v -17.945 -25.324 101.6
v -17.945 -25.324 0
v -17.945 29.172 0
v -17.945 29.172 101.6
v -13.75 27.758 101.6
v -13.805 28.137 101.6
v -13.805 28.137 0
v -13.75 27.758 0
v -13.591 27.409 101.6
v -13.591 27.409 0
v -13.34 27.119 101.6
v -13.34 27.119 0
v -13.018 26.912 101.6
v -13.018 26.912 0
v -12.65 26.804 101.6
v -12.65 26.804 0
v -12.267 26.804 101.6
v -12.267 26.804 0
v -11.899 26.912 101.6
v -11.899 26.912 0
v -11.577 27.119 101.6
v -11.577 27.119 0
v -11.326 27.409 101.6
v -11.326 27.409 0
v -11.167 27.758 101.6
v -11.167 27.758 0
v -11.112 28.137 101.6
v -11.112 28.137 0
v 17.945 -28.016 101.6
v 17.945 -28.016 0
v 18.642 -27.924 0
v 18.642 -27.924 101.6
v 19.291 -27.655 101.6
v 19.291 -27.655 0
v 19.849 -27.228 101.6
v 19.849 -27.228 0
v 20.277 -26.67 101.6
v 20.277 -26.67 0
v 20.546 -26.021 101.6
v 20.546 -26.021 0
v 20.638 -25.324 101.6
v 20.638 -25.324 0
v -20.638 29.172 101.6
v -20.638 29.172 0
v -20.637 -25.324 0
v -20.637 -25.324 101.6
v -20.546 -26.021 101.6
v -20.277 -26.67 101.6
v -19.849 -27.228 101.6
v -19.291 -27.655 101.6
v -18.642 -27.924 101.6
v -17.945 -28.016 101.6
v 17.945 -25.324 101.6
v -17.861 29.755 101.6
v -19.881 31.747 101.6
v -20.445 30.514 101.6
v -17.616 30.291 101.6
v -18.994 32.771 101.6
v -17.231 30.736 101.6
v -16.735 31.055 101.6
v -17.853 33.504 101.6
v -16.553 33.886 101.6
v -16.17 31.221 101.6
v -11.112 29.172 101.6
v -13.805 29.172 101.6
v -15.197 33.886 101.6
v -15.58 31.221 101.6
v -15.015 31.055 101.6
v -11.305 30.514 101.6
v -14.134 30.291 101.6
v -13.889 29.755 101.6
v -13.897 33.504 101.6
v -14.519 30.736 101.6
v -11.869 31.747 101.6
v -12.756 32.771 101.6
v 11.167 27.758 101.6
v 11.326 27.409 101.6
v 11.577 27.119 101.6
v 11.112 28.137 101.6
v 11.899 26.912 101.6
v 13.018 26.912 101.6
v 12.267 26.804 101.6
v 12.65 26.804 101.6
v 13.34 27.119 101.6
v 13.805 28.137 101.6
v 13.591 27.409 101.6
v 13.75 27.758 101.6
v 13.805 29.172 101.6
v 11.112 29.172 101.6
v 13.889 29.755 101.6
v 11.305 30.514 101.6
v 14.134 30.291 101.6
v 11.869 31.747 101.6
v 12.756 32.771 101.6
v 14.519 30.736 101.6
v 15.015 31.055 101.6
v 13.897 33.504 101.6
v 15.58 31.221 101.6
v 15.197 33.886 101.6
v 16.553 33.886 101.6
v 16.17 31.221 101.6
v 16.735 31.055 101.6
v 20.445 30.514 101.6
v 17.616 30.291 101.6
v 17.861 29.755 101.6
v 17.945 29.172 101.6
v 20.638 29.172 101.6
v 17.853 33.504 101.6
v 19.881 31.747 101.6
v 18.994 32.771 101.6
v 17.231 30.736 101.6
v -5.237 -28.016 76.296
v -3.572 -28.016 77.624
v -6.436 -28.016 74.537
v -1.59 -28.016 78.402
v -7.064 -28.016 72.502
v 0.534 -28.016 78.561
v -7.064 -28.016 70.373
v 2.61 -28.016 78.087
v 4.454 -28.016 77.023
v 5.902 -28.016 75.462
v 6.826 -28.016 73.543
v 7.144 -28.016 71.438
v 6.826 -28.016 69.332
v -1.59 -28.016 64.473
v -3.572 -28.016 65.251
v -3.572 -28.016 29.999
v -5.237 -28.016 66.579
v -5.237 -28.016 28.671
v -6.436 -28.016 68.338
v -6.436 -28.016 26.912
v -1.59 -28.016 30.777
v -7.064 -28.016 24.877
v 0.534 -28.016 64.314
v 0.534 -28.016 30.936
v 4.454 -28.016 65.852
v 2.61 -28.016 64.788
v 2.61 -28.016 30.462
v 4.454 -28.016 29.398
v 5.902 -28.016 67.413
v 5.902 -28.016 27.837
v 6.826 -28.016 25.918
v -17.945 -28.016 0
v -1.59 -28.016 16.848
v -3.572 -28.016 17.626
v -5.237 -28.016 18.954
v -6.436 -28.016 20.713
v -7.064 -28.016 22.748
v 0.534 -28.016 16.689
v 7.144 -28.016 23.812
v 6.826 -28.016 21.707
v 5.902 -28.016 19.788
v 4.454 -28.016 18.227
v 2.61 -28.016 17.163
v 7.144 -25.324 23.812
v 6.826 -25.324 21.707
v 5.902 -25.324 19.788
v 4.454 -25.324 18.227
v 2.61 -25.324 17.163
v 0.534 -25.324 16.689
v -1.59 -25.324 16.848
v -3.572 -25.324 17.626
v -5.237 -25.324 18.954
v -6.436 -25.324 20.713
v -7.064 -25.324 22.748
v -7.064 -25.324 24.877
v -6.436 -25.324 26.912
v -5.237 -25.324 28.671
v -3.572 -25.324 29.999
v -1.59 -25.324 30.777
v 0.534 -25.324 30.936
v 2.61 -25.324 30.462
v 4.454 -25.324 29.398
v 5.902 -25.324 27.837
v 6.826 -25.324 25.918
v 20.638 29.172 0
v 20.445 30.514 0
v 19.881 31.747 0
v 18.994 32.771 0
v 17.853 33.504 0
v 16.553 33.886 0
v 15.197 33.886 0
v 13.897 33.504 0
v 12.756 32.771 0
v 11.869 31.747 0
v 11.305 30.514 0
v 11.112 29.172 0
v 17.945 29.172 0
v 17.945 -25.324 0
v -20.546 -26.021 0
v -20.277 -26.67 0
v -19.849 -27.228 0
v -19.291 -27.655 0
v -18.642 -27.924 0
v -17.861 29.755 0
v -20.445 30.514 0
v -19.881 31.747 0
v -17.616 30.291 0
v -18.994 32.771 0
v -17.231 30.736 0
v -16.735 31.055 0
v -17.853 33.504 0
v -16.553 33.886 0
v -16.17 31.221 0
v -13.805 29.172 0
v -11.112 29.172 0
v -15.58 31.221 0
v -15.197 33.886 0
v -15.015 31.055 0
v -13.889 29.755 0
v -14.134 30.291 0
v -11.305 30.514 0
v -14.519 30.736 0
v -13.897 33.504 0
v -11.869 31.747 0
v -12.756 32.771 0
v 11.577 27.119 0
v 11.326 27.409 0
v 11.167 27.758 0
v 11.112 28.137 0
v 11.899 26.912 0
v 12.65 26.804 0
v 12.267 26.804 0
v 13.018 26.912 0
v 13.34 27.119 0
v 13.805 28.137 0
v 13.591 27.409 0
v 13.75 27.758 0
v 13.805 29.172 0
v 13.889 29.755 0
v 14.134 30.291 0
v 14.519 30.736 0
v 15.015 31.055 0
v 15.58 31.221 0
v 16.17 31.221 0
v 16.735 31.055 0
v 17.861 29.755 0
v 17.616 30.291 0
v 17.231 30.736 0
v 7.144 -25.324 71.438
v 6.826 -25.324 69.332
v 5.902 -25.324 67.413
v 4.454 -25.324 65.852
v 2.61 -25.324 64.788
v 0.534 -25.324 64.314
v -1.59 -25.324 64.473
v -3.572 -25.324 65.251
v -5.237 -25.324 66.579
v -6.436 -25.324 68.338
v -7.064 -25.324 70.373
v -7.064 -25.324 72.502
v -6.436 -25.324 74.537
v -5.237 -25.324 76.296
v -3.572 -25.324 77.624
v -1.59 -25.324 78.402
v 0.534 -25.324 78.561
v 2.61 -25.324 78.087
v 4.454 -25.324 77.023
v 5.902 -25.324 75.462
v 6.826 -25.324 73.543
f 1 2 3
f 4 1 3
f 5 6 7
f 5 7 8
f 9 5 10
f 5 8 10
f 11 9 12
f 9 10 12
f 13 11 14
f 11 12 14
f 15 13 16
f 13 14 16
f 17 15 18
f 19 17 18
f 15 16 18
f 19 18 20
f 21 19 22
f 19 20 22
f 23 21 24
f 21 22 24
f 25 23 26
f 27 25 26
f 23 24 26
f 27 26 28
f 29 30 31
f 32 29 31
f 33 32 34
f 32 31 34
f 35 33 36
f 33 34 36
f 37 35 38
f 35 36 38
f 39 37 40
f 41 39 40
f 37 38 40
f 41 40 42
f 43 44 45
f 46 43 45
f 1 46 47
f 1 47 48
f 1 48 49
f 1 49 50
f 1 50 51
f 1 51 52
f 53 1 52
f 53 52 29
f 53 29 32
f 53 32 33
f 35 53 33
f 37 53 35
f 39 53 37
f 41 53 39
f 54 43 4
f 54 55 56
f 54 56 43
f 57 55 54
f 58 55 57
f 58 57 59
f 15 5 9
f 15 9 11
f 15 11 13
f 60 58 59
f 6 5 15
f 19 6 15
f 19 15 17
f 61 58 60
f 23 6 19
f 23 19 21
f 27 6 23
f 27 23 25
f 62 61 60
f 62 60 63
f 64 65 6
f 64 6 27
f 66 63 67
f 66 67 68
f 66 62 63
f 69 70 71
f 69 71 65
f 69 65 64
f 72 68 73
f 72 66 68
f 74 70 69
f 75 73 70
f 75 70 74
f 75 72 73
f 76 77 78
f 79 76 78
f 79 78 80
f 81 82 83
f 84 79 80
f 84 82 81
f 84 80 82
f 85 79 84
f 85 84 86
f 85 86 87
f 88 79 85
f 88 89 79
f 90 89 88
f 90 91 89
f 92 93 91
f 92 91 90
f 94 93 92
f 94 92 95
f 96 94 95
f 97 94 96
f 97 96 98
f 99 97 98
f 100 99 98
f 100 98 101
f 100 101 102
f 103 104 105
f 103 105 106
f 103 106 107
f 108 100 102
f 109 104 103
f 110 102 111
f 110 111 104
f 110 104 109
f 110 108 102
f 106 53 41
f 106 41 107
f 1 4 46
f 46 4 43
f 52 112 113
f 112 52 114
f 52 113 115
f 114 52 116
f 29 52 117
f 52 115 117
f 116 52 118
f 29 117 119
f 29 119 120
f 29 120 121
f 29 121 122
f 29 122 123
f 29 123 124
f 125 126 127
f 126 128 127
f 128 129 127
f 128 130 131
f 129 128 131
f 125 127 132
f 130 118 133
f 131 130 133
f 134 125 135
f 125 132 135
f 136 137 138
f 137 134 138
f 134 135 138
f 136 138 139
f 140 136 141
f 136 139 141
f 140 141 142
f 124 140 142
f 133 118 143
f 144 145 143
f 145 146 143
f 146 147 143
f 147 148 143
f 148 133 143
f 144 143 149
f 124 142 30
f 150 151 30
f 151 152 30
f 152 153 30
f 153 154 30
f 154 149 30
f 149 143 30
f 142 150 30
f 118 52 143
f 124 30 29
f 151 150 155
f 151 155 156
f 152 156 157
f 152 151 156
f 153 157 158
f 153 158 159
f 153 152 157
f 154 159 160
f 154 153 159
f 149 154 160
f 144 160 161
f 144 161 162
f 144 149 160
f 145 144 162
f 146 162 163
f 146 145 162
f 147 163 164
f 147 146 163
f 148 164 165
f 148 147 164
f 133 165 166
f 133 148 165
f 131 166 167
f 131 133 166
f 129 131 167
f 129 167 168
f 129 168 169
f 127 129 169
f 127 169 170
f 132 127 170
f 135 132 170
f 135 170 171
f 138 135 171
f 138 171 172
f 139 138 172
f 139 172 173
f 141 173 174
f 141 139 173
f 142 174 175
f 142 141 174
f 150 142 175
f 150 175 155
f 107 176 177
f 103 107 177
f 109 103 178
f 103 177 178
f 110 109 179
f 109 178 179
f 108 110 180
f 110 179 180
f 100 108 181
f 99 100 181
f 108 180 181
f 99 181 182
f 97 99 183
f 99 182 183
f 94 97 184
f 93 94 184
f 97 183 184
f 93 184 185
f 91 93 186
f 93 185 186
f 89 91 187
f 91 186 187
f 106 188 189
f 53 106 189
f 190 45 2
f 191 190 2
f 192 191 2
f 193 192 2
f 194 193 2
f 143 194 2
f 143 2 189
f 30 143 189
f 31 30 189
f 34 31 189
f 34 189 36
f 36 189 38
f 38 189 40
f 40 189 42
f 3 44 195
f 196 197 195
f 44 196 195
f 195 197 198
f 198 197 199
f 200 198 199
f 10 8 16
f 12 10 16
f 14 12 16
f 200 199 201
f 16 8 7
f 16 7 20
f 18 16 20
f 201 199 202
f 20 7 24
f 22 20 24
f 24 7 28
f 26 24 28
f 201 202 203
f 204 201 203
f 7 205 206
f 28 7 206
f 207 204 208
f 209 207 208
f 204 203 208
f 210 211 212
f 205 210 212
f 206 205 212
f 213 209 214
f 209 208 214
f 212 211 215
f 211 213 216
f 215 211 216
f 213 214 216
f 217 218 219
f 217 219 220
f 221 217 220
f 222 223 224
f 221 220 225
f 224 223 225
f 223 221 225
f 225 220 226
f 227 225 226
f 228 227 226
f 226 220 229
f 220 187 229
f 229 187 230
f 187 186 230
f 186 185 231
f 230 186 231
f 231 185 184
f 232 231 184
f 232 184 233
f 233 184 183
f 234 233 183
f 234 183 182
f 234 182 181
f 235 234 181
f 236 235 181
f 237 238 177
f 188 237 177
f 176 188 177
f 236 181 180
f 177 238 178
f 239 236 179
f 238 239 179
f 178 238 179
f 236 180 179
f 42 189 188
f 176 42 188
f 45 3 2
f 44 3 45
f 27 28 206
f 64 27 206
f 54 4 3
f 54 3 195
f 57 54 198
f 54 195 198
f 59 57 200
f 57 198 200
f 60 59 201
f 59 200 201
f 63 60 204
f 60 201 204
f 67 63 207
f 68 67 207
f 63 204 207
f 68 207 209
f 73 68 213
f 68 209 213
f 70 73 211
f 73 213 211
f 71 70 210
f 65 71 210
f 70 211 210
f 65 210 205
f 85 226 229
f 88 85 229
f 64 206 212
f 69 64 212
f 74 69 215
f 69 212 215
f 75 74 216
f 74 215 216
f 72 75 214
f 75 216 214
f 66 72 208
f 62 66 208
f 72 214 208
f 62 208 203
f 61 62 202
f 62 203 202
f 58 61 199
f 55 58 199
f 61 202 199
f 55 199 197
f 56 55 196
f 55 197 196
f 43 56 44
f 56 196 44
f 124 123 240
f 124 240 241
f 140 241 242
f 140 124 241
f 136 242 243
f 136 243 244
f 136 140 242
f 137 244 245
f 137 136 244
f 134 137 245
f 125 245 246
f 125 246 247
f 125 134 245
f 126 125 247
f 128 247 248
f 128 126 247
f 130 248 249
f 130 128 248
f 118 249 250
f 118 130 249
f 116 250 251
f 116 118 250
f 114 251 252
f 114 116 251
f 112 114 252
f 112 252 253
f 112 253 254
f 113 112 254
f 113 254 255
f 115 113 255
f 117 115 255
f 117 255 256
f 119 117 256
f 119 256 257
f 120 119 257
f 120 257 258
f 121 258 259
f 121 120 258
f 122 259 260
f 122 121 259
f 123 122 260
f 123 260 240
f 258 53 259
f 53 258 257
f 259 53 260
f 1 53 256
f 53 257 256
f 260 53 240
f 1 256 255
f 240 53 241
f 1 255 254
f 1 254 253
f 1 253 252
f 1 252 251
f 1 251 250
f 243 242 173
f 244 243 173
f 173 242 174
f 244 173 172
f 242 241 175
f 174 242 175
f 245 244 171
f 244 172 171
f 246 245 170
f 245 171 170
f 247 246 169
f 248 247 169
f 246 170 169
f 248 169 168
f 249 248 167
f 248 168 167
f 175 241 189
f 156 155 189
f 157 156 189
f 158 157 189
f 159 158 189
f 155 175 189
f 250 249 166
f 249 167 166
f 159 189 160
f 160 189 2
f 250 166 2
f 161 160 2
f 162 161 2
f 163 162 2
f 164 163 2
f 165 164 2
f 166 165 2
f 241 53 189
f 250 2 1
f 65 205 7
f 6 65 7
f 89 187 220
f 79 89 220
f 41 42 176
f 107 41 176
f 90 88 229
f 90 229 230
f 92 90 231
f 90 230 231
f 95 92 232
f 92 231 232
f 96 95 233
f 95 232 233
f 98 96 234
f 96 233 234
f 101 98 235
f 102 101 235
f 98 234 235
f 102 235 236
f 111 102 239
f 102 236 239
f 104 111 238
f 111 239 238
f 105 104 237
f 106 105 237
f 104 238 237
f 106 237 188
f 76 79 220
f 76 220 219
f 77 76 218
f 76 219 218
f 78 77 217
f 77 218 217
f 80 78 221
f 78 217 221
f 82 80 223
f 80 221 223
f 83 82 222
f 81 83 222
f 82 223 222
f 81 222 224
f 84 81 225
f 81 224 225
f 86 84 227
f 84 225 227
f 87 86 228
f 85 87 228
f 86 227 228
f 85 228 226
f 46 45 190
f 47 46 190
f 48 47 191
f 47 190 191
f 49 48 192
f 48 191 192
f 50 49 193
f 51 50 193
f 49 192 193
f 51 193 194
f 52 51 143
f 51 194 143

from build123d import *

# Parameters (mm, degrees)
BASE_EXTRUDE_DEPTH = 101.6
HOLE1_START        = -28.0162
HOLE1_OUTLINE_R    = 7.14375
HOLE1_DEPTH        = 2.6924
LPATTERN2_COUNT    = 2
LPATTERN2_PITCH    = 47.625


# Read off the part's stored shape, not the designer's step: Hole1
with BuildPart() as part:
    # Sketch1 → Base-Extrude (new body)
    with BuildSketch(Plane.XY):
        with BuildLine():
            Line((-20.6375, 29.1719), (-20.6375, -25.3238))
            ThreePointArc((-20.6375, -25.3238), (-19.848914298, -27.227614298), (-17.9451, -28.0162))
            Line((-17.9451, -28.0162), (17.9451, -28.0162))
            ThreePointArc((17.9451, -28.0162), (19.848914298, -27.227614298), (20.6375, -25.3238))
            Line((20.6375, -25.3238), (20.6375, 29.1719))
            ThreePointArc((20.6375, 29.1719), (15.875, 33.9344), (11.1125, 29.1719))
            Line((11.1125, 29.1719), (11.1125, 28.13685))
            ThreePointArc((11.1125, 28.13685), (12.4587, 26.79065), (13.8049, 28.13685))
            Line((13.8049, 28.13685), (13.8049, 29.1719))
            ThreePointArc((13.8049, 29.1719), (15.875, 31.242), (17.9451, 29.1719))
            Line((17.9451, 29.1719), (17.9451, -25.3238))
            Line((17.9451, -25.3238), (-17.9451, -25.3238))
            Line((-17.9451, -25.3238), (-17.9451, 29.1719))
            ThreePointArc((-17.9451, 29.1719), (-15.875, 31.242), (-13.8049, 29.1719))
            Line((-13.8049, 29.1719), (-13.8049, 28.13685))
            ThreePointArc((-13.8049, 28.13685), (-12.4587, 26.79065), (-11.1125, 28.13685))
            Line((-11.1125, 28.13685), (-11.1125, 29.1719))
            ThreePointArc((-11.1125, 29.1719), (-15.875, 33.9344), (-20.6375, 29.1719))
        make_face()
    extrude(amount=BASE_EXTRUDE_DEPTH)

    # Hole1 outline → Hole1 (cut)
    with BuildSketch(Plane(origin=(0, 0, 0), x_dir=(1, 0, 0), z_dir=(0, 1, 0)).offset(HOLE1_START)):
        with Locations((0, -23.8125)):
            Circle(HOLE1_OUTLINE_R)
    hole1 = extrude(amount=HOLE1_DEPTH, mode=Mode.SUBTRACT)

    # LPattern2: Hole1 ×2
    with Locations(*[(0, 0, i * LPATTERN2_PITCH) for i in range(1, LPATTERN2_COUNT)]):
        add(hole1, mode=Mode.SUBTRACT)


solid = part.part
